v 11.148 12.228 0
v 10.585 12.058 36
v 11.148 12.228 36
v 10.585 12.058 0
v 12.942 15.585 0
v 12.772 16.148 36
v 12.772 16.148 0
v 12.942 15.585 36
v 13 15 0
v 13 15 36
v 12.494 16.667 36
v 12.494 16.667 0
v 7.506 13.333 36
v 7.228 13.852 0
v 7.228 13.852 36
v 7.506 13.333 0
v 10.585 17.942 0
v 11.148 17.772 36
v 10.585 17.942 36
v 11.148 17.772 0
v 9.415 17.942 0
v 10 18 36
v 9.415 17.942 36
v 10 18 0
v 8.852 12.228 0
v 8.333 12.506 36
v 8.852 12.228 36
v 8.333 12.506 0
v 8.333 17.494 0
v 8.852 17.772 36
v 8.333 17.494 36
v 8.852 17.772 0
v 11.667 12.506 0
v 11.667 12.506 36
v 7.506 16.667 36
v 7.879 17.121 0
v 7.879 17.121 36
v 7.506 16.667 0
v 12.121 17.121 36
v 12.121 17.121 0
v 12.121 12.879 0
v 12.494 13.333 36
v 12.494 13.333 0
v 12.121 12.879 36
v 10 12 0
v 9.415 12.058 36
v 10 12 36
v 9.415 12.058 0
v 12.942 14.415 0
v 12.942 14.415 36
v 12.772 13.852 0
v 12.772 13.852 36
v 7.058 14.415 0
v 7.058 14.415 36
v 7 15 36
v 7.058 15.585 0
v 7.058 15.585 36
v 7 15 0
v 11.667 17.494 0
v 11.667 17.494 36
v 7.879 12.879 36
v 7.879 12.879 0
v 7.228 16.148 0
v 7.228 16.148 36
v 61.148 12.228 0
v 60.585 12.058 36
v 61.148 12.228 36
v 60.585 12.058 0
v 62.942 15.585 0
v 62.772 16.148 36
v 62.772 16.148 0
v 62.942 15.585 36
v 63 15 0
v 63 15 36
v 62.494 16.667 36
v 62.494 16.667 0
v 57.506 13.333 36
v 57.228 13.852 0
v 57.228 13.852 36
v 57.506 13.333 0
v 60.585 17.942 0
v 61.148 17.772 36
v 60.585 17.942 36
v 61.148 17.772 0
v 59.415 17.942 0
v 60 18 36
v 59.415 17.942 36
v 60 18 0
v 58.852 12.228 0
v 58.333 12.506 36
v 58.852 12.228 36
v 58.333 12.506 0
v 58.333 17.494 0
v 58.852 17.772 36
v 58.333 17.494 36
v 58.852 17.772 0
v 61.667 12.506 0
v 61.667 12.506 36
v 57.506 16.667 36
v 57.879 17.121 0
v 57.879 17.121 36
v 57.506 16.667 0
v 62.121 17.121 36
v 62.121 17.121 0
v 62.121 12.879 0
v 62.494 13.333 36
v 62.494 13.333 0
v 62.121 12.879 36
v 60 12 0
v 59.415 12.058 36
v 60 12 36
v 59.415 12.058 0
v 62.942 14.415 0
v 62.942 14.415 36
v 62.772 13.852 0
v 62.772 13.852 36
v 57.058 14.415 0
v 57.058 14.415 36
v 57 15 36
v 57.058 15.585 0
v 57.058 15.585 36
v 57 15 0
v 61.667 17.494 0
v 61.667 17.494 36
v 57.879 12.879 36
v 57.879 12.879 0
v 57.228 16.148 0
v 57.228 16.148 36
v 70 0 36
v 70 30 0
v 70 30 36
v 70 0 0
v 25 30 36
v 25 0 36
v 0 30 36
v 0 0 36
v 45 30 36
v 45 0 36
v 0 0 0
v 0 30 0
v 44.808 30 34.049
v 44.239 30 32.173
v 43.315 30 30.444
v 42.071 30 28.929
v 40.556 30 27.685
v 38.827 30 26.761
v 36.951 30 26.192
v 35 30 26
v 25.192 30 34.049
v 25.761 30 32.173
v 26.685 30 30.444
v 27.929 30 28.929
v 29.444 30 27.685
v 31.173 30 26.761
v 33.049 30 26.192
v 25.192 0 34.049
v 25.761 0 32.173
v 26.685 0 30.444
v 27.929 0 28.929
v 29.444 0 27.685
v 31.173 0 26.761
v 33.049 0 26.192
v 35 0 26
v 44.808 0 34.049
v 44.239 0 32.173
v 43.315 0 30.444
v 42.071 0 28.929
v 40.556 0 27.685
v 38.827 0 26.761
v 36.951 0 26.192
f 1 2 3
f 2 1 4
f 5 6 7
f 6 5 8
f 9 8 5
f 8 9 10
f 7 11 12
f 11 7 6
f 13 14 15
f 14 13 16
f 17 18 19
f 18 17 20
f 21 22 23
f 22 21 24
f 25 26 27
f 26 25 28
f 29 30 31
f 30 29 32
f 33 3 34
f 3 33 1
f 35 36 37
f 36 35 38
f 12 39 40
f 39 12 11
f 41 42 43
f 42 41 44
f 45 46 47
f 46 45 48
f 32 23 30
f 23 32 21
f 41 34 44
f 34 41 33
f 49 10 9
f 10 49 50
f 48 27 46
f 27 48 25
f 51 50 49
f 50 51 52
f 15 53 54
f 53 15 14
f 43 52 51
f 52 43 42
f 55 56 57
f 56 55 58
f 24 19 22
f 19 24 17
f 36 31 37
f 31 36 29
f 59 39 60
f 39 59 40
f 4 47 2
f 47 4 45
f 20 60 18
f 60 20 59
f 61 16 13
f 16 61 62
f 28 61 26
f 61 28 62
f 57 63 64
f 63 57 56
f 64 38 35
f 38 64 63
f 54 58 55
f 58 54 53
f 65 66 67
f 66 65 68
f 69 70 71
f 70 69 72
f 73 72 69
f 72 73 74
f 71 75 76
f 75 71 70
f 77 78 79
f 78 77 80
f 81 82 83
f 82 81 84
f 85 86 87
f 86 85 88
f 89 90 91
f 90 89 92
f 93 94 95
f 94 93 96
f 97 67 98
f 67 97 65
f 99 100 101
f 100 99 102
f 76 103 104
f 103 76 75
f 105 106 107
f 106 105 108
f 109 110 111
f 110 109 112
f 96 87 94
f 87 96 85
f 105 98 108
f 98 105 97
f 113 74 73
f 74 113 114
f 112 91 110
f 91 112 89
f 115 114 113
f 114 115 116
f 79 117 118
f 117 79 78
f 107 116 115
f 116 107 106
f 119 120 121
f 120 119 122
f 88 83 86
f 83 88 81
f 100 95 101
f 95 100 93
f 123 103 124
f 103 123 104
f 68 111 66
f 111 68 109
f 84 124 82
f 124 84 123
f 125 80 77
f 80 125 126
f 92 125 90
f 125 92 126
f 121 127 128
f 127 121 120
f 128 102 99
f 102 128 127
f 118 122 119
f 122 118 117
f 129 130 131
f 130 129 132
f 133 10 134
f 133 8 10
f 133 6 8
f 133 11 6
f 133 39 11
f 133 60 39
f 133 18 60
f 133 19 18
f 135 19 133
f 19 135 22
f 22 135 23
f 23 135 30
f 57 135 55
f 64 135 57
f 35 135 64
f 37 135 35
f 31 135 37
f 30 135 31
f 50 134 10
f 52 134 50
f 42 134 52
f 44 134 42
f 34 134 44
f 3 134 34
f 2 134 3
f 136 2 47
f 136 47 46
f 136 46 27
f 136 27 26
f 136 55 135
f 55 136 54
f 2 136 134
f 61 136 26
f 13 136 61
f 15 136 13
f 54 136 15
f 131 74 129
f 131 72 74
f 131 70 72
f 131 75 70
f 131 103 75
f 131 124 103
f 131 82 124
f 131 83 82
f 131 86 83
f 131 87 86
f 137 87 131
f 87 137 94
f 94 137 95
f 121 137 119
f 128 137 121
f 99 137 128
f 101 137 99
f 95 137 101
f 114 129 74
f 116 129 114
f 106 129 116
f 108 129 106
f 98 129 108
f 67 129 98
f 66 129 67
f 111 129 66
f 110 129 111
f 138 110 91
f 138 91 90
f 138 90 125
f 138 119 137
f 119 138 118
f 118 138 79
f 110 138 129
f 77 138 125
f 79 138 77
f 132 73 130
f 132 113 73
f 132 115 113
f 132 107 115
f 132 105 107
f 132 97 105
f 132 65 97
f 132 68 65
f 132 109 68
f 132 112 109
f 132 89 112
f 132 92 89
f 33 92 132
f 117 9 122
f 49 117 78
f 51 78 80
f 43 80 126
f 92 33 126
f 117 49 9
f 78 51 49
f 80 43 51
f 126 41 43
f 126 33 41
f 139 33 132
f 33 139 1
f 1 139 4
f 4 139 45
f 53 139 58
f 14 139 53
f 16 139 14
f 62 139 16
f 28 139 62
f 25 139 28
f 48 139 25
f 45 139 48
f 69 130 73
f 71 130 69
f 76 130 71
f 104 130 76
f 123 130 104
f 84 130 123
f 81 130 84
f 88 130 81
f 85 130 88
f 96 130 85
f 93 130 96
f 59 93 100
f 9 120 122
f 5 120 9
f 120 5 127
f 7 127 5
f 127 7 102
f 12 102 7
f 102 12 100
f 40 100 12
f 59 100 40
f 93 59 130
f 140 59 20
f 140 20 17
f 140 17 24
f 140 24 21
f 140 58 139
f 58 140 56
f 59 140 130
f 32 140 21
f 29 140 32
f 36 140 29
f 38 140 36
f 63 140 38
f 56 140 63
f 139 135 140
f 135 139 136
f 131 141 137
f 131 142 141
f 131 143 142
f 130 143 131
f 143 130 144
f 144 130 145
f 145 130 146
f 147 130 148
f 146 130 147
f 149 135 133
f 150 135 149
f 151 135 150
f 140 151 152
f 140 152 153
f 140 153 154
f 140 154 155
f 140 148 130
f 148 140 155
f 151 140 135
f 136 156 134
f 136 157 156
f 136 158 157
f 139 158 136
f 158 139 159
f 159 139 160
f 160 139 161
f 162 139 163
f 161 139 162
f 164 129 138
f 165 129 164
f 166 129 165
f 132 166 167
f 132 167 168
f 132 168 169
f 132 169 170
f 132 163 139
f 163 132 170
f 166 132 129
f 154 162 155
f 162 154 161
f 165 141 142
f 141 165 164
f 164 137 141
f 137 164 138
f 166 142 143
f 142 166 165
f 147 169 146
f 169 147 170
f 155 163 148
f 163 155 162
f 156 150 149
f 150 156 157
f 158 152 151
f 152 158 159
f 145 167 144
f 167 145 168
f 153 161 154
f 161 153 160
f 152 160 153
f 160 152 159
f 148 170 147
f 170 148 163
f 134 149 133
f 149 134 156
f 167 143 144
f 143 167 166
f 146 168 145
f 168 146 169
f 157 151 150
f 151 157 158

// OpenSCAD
$fn = 32;

// ----------------------------------------------------------------------
// Saddle clamp: plain shaft clamp
// ----------------------------------------------------------------------

// --- parameters (mm) ---
blk_l = 70;               // block length, X
blk_w = 30;               // block width, Y
blk_h = 36;               // block height
clamp_r = 10;             // shaft groove radius
hole_r = 3;               // bolt hole radius
hole_m = 10;              // bolt hole margin from the ends
fit_tol = 0.1;            // tolerance for press fits, mm
free_tol = 0.3;           // tolerance for clearance fits, mm

saw_depth = clamp_r + 3;  // saw kerf depth

difference() {
  cube([blk_l, blk_w, blk_h]);
  translate([blk_l / 2, -1, blk_h])
    rotate([-90, 0, 0])
      cylinder(h = blk_w + 2, r = clamp_r);
  for (sx = [0, 1])
    translate([sx ? blk_l - hole_m : hole_m, blk_w / 2, -1])
      cylinder(r = hole_r, h = blk_h + 2);
}
